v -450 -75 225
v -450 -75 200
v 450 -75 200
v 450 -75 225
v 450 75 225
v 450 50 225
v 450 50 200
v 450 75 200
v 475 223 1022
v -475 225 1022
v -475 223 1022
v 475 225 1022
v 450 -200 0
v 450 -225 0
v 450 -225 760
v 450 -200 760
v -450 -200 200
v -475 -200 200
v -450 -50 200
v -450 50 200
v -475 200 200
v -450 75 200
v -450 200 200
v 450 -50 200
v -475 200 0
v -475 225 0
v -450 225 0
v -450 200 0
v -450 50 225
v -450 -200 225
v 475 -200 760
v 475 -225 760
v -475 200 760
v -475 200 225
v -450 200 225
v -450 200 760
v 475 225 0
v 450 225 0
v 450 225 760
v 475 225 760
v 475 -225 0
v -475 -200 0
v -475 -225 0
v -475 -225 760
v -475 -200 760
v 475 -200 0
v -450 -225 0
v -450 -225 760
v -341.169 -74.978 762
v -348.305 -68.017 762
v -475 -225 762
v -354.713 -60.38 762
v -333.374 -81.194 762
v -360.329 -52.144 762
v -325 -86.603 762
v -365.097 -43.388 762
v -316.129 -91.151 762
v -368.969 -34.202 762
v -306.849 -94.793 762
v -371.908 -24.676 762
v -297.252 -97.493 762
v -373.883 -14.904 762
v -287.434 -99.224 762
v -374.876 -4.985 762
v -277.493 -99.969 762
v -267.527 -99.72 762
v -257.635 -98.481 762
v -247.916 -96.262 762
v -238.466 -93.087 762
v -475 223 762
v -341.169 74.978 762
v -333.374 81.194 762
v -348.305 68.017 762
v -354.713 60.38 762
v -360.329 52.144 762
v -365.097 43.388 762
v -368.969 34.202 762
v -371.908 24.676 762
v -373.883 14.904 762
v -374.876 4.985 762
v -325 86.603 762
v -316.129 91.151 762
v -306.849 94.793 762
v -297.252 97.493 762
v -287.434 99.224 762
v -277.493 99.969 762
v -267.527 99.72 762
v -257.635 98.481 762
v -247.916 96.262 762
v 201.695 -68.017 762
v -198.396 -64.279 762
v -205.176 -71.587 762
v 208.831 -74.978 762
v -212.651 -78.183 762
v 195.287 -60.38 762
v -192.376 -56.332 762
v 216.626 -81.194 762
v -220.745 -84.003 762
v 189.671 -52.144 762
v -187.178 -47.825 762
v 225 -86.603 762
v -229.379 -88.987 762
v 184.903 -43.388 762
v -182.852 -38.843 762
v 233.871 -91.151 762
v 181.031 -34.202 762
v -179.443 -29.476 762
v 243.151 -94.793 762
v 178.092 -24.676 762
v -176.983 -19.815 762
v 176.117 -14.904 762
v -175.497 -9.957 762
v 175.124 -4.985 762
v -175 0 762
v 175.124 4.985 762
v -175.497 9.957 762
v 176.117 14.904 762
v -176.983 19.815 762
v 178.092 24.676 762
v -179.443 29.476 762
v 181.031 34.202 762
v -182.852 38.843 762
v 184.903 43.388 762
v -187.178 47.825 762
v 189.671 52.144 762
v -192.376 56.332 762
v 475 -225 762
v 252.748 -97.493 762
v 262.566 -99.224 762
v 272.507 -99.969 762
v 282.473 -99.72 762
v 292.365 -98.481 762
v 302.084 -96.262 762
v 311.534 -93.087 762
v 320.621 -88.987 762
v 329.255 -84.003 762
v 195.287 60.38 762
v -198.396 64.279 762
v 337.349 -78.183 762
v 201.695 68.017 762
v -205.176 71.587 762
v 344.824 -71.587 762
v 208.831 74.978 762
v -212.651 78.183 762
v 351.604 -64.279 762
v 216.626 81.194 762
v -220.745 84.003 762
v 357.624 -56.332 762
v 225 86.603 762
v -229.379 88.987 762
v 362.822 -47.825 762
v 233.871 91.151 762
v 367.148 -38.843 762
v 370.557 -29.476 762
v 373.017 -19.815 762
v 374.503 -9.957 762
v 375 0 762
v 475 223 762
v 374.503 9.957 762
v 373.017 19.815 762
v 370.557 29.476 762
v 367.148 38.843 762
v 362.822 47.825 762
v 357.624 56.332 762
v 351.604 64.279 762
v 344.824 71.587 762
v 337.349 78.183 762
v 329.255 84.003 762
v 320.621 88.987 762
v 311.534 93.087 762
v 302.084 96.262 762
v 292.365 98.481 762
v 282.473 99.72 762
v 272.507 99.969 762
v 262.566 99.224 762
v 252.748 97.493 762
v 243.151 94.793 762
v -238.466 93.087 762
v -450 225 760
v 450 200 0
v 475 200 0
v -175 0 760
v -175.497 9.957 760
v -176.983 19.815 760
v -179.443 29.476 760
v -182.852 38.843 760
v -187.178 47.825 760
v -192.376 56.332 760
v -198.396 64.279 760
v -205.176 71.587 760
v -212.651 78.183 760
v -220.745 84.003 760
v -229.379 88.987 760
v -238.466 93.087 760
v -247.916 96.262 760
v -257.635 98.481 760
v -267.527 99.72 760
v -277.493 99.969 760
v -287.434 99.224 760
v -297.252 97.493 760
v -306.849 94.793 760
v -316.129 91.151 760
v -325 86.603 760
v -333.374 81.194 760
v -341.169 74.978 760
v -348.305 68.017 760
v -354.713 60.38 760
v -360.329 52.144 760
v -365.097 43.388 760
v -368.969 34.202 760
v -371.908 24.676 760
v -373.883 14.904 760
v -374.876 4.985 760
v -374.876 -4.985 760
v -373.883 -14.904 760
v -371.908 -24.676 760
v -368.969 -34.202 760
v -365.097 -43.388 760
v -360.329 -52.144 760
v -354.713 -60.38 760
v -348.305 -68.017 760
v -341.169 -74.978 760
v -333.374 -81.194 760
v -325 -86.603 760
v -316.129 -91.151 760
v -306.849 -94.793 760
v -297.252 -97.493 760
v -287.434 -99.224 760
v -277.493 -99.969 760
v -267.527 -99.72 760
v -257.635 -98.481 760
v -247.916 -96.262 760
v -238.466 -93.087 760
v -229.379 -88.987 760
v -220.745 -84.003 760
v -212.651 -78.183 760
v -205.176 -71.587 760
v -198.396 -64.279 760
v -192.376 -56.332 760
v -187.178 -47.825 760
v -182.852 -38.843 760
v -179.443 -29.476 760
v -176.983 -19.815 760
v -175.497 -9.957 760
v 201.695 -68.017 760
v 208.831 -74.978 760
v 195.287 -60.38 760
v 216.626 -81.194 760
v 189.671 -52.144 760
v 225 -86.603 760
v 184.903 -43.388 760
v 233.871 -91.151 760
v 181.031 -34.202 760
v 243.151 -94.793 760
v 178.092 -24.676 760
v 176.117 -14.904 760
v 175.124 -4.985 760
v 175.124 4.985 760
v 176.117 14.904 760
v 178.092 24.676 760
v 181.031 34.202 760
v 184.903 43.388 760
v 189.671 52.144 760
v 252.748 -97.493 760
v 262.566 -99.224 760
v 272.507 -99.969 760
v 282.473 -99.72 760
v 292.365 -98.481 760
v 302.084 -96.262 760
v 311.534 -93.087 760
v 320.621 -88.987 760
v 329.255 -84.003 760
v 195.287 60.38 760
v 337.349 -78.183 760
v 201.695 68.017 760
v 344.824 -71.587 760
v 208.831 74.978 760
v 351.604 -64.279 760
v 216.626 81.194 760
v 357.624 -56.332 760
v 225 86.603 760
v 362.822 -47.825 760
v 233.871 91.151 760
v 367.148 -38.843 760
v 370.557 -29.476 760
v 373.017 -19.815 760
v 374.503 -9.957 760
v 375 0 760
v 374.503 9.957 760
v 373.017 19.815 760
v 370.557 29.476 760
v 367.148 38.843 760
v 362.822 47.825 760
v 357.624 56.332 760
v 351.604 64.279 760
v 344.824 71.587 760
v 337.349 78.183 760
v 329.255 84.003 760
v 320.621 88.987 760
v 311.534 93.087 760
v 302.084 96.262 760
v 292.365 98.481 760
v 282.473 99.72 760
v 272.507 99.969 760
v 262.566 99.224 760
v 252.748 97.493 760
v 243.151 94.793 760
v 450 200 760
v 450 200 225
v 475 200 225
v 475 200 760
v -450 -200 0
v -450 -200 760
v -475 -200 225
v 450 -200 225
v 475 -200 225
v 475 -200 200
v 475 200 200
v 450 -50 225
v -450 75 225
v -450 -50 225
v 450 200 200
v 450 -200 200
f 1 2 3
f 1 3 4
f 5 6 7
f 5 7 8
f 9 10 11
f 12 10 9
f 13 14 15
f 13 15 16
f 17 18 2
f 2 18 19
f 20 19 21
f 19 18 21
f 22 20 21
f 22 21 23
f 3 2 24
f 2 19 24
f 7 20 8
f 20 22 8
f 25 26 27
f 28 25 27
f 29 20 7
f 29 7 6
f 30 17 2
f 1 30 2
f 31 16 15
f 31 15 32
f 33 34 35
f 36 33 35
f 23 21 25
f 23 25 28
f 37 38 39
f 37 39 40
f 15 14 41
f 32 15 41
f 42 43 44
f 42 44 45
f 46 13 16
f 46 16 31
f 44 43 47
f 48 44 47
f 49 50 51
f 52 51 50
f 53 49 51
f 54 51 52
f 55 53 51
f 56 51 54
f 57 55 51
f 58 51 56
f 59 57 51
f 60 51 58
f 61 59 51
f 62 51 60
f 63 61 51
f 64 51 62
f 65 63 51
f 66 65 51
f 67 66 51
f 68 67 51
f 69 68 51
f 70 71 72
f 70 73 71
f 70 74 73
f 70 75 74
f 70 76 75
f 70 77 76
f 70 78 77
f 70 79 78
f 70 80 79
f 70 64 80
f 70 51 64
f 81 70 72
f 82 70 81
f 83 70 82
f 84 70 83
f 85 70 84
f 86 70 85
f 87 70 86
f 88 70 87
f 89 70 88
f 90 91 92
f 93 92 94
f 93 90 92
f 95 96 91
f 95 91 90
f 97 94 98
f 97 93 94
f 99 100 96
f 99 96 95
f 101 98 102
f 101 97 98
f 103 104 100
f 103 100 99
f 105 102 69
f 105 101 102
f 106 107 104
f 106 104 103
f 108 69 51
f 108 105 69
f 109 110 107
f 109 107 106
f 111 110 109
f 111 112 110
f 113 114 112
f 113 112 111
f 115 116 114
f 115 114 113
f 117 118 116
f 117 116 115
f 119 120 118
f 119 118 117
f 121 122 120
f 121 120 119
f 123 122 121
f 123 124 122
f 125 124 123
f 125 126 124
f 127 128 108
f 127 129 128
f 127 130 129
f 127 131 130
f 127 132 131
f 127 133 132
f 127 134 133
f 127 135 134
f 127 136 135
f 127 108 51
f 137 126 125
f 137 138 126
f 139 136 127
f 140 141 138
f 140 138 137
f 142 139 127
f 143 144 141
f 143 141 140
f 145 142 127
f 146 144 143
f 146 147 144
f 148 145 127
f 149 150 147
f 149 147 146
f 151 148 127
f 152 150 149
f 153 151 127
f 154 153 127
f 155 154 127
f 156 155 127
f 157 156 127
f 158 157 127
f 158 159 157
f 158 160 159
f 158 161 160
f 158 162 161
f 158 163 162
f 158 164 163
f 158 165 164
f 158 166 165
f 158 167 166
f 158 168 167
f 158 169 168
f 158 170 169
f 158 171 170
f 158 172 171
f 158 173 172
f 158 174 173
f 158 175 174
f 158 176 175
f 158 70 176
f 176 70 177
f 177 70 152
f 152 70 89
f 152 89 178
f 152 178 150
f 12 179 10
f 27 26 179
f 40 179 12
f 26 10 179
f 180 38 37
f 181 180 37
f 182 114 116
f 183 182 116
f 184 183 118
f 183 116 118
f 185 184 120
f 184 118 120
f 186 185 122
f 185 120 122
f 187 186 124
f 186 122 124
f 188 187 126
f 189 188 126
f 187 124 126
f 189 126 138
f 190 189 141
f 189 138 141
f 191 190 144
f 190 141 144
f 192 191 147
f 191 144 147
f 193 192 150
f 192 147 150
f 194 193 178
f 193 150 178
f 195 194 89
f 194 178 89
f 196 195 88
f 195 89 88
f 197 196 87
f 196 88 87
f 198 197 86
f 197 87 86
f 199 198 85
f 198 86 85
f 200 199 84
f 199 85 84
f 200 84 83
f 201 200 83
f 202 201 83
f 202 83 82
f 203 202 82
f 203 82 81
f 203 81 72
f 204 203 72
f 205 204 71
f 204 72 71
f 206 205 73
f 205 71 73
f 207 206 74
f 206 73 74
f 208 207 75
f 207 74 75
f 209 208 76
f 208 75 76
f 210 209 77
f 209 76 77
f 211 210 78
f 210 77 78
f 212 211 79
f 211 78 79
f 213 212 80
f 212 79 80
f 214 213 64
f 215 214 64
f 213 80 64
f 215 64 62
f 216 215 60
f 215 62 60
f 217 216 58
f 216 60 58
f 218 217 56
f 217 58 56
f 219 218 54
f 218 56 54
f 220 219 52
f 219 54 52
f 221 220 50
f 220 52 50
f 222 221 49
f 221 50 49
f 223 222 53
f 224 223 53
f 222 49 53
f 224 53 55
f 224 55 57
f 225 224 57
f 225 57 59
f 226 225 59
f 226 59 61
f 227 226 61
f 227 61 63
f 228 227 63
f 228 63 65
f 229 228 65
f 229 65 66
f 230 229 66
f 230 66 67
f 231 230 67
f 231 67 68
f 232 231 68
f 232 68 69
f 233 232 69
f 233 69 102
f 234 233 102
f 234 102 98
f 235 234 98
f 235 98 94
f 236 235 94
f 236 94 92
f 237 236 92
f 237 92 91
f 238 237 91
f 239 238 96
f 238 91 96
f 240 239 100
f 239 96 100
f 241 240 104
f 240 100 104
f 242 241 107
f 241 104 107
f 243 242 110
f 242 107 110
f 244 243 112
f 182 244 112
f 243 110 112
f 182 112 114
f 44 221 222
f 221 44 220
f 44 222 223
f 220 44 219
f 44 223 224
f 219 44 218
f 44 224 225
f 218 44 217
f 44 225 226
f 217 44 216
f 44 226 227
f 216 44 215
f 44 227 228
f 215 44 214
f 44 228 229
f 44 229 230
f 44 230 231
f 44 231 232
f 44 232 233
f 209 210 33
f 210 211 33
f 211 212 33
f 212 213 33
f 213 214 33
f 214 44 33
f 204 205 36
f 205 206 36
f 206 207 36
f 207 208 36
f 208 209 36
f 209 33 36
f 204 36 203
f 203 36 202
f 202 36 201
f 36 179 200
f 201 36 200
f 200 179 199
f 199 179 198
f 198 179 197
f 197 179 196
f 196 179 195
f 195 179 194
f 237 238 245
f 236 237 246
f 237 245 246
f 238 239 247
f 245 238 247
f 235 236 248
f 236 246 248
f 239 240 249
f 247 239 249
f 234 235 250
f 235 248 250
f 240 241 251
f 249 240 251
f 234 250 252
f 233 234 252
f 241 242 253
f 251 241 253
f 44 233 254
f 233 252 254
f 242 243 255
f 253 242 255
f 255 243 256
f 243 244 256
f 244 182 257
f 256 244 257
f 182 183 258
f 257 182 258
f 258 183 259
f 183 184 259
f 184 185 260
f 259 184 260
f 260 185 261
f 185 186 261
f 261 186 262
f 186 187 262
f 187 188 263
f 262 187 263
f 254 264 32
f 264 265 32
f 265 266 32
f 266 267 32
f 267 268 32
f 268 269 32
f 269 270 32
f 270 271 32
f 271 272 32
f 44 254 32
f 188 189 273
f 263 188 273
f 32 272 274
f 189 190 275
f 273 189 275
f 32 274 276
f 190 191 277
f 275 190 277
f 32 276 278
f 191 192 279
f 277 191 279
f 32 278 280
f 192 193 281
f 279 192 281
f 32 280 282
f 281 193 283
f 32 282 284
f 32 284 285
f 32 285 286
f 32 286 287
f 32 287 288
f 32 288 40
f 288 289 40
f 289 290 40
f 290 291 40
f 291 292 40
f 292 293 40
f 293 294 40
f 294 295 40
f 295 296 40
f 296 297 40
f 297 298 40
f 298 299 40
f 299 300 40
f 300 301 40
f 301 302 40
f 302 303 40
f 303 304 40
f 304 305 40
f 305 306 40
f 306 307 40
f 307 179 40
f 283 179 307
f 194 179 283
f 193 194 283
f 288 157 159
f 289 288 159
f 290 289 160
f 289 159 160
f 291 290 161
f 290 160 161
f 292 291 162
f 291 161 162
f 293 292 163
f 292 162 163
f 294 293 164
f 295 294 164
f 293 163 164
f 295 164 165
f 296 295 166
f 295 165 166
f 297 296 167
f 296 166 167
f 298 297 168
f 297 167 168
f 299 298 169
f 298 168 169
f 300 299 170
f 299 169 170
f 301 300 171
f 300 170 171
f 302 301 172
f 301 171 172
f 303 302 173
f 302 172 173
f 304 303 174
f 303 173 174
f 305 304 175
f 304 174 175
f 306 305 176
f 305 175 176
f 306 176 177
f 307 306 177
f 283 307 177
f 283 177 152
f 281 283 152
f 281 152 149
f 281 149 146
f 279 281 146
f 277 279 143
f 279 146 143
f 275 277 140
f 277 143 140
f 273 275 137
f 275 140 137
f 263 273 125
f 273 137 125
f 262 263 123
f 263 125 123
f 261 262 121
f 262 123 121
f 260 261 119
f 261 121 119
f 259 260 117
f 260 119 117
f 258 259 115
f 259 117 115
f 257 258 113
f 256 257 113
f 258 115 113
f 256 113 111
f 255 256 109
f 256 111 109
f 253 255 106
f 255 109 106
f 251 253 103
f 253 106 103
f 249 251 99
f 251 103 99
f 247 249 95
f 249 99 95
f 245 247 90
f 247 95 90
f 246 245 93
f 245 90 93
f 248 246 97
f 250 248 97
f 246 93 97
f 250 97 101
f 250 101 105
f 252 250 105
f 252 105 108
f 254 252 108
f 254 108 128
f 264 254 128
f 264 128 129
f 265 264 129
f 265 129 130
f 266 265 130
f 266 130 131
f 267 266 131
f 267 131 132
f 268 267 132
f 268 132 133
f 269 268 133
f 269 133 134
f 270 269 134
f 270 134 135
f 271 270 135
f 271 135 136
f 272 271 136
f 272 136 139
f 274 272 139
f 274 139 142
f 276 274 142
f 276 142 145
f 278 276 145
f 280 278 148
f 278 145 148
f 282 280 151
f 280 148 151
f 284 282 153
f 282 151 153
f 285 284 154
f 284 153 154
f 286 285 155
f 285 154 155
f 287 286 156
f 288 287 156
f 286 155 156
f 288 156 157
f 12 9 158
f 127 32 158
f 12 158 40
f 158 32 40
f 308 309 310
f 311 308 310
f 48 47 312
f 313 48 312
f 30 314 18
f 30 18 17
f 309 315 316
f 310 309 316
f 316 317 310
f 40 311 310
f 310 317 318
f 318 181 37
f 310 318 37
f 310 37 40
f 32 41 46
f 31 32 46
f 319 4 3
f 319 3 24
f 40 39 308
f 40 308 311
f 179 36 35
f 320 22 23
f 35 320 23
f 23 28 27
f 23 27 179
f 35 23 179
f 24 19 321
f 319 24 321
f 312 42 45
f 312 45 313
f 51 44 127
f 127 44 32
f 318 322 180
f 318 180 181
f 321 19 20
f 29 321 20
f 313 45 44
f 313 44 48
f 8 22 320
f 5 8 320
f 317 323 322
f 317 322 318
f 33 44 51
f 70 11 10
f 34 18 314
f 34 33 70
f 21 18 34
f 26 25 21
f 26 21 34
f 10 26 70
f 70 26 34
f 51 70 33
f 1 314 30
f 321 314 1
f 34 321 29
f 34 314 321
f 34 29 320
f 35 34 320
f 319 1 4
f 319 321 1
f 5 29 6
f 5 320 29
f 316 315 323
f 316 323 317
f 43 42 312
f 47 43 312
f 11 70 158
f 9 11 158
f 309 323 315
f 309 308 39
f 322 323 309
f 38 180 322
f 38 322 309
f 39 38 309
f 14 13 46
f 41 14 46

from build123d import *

# Parameters (mm, degrees)
F0_W      = 25
F0_H      = 25
F1_DEPTH  = 760
F2_DEPTH  = 760
F3_W      = 950
F3_H      = 450
F4_DEPTH  = 2
F5_W      = 950
F5_H      = 2
F6_DEPTH  = 260
F7_W      = 25
F7_H      = 25
F8_DEPTH  = 400
F9_W      = 25
F9_H      = 25
F10_DEPTH = 900
F11_R     = 100
F12_DEPTH = 2


with BuildPart() as f1:
    # F0 (on Top) → F1 (new body)
    with BuildSketch(Plane.XY):
        with Locations((-462.5, 212.5)):
            Rectangle(F0_W, F0_H)
    extrude(amount=F1_DEPTH)

    # F3 (on face) → F4 (join)
    with BuildSketch(Plane.XY.offset(760)):
        Rectangle(F3_W, F3_H)
    extrude(amount=F4_DEPTH)

    # F5 (on face) → F6 (join)
    with BuildSketch(Plane.XY.offset(762)):
        with Locations((0, 224)):
            Rectangle(F5_W, F5_H)
    extrude(amount=F6_DEPTH)

    # F7 (on face) → F8 (join, through all)
    with BuildSketch(Plane.XZ.offset(-200)):
        with Locations((-462.5, 212.5)):
            Rectangle(F7_W, F7_H)
    extrude(amount=F8_DEPTH)

    # F9 (on face) → F10 (join)
    with BuildSketch(Plane.YZ.offset(-450)):
        with Locations((62.5, 212.5)):
            Rectangle(F9_W, F9_H)
        with Locations((-62.5, 212.5)):
            Rectangle(F9_W, F9_H)
    extrude(amount=F10_DEPTH)

    # F11 (on face) → F12 (cut, through all)
    with BuildSketch(Plane.XY.offset(762)):
        with Locations((-275, 0)):
            Circle(F11_R)
        with Locations((275, 0)):
            Circle(F11_R)
    extrude(amount=-F12_DEPTH, mode=Mode.SUBTRACT)


with BuildPart() as f2:
    # F0 (on Top) → F2 (new body)
    with BuildSketch(Plane.XY):
        with Locations((462.5, -212.5)):
            Rectangle(F0_W, F0_H)
    extrude(amount=F2_DEPTH)


with BuildPart() as f2b:
    # F0 (on Top) → F2, piece 2 (new body)
    with BuildSketch(Plane.XY):
        with Locations((462.5, 212.5)):
            Rectangle(F0_W, F0_H)
    extrude(amount=F2_DEPTH)

    # F7 (on face) → F8, piece 2 (join, through all)
    with BuildSketch(Plane.XZ.offset(-200)):
        with Locations((462.5, 212.5)):
            Rectangle(F7_W, F7_H)
    extrude(amount=F8_DEPTH)


with BuildPart() as f2c:
    # F0 (on Top) → F2, piece 3 (new body)
    with BuildSketch(Plane.XY):
        with Locations((-462.5, -212.5)):
            Rectangle(F0_W, F0_H)
    extrude(amount=F2_DEPTH)


solid = Compound([f1.part, f2.part, f2b.part, f2c.part])
